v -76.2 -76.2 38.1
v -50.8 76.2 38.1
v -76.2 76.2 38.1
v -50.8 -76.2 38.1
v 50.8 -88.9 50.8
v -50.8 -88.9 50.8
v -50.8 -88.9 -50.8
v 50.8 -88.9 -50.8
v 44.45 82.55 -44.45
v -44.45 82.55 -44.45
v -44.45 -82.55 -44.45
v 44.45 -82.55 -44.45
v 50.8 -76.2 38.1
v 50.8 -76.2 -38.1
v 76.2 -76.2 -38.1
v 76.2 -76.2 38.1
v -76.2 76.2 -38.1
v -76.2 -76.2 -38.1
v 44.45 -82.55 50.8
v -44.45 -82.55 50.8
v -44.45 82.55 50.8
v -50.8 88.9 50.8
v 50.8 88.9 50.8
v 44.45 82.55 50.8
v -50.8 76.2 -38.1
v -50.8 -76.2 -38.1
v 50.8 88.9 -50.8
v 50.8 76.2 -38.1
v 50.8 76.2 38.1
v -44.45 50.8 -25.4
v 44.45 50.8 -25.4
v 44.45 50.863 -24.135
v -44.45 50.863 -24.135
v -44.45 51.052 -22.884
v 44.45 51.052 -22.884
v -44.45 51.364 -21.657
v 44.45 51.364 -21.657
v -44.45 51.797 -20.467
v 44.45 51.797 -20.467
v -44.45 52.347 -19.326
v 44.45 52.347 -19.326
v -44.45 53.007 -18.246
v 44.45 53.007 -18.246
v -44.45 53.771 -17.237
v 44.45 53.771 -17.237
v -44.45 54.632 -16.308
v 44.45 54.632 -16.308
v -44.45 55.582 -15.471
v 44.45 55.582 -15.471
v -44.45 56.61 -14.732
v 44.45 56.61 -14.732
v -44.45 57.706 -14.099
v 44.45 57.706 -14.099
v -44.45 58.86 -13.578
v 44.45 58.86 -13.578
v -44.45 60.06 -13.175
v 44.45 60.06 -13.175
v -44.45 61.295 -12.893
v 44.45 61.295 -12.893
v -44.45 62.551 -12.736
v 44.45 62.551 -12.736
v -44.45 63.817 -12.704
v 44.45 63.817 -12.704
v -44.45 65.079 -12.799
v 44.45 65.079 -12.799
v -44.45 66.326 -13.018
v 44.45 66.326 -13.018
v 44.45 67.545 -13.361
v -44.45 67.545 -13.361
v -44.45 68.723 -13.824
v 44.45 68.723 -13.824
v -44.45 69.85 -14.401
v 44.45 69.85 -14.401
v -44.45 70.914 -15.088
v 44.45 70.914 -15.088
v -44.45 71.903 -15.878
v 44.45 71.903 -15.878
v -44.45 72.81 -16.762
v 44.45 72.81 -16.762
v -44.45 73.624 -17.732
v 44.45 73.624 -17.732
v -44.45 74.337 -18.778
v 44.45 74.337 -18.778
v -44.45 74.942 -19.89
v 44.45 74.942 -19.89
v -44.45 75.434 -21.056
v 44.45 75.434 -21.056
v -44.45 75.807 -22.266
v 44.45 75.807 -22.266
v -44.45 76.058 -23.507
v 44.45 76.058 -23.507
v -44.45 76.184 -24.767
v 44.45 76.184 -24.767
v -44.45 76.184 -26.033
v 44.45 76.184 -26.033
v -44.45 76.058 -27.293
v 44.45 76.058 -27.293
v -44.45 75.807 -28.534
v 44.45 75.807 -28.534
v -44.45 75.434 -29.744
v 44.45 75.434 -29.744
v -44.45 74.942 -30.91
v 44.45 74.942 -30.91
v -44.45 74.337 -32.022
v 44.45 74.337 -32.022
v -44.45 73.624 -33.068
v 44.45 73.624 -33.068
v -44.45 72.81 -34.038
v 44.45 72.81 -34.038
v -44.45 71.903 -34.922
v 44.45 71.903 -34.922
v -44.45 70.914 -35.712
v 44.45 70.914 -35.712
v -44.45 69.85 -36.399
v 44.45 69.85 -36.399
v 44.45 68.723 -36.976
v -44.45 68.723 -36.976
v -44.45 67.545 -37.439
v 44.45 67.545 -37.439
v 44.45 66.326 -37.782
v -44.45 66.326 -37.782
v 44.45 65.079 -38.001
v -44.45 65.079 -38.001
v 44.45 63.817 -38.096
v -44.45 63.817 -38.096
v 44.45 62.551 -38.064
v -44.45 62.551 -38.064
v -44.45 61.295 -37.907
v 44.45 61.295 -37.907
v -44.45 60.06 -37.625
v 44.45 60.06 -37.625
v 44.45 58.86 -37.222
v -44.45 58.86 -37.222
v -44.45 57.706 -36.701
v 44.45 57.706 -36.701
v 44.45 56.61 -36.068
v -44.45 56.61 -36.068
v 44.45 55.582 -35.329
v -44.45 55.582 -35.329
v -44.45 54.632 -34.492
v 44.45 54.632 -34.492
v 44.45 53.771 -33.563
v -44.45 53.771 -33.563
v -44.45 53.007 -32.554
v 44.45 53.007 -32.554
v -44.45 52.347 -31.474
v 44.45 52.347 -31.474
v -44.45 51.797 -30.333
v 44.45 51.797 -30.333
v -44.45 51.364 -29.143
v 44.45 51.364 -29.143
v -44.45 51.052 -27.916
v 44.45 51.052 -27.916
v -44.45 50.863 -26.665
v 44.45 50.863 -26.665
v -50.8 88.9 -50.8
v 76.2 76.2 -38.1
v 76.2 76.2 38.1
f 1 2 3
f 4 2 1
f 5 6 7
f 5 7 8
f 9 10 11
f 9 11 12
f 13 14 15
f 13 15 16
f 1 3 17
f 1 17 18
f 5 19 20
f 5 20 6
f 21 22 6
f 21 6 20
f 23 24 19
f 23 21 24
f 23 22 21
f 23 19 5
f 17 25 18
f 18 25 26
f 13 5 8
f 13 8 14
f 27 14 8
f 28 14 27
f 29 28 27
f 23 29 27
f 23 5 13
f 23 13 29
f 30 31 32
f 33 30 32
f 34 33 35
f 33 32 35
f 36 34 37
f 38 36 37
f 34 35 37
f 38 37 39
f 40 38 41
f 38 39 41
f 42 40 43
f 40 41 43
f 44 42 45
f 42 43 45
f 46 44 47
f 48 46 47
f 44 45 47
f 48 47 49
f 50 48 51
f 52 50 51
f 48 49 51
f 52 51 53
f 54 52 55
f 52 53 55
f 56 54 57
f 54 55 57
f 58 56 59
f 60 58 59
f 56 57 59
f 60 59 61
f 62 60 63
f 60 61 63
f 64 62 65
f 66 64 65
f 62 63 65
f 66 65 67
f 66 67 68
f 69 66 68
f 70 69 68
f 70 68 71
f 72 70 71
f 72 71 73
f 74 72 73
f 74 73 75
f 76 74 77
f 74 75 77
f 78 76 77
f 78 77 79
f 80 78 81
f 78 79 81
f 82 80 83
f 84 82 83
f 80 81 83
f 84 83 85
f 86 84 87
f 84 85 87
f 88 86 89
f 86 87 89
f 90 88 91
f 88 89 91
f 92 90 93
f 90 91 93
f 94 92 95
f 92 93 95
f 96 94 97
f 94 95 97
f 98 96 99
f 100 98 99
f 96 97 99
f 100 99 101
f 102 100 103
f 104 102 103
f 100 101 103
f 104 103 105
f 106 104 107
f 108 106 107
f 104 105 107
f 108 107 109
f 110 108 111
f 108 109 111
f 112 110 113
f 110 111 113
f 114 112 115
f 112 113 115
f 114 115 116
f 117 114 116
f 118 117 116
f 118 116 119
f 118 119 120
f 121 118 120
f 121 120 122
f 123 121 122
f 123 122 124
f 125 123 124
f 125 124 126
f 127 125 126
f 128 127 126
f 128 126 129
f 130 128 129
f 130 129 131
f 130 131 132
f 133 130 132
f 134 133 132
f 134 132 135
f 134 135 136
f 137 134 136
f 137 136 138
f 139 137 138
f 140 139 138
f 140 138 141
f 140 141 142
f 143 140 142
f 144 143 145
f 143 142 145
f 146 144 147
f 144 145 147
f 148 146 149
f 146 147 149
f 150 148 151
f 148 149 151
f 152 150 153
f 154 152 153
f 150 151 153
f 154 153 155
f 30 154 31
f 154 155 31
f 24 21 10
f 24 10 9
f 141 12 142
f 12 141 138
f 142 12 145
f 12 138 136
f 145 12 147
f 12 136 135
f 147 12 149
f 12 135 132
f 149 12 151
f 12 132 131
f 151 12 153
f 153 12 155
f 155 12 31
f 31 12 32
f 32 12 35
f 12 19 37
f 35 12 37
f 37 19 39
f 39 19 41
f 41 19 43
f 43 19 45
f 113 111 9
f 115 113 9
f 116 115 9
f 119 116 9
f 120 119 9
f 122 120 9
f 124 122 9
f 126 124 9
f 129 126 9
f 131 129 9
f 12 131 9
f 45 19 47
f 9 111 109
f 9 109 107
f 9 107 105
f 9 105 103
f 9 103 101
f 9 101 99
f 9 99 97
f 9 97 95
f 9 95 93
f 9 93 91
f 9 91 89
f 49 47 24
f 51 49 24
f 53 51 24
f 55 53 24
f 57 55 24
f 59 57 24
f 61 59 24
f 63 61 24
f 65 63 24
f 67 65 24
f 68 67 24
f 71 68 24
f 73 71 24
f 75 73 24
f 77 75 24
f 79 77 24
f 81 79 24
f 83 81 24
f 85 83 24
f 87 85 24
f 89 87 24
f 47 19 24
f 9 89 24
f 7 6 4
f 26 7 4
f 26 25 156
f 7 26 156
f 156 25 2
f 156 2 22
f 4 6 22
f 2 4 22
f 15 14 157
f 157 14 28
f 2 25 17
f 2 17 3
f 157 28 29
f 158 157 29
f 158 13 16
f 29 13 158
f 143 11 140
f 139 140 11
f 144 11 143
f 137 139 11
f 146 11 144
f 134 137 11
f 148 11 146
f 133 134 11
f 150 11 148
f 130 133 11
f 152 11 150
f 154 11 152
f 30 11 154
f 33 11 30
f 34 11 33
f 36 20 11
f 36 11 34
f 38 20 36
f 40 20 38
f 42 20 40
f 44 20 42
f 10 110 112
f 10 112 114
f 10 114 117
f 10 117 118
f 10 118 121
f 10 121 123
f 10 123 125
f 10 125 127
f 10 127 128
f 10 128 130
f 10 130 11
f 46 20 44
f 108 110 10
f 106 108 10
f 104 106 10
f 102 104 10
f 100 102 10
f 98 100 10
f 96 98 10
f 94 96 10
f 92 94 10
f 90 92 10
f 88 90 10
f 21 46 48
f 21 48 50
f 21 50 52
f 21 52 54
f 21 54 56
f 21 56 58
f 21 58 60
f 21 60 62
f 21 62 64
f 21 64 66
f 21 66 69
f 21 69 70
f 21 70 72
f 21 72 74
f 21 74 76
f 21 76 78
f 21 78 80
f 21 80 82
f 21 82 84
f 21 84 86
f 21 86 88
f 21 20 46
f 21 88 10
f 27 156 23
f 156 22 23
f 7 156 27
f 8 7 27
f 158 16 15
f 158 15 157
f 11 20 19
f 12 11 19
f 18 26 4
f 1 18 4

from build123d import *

# Parameters (mm, degrees)
F0_W     = 101.6
F0_H     = 177.8
F1_DEPTH = 50.8
F2_T     = -6.35
F3_W     = 152.4
F3_H     = 76.2
F4_DEPTH = 25.4
F5_W     = 152.4
F5_H     = 76.2
F6_DEPTH = 25.4
F7_R     = 12.7
F8_DEPTH = 88.9


with BuildPart() as f1:
    # F0 (on Top) → F1 (new body, symmetric)
    with BuildSketch(Plane.XY):
        Rectangle(F0_W, F0_H)
    extrude(amount=F1_DEPTH, both=True)

    # F2
    f2_openings = [f1.faces().sort_by_distance(p)[0] for p in [
        (0, 0, 50.8),
    ]]
    offset(amount=F2_T, openings=f2_openings)

    # F3 (on face) → F4 (join)
    with BuildSketch(Plane.YZ.offset(50.8)):
        Rectangle(F3_W, F3_H)
    extrude(amount=F4_DEPTH)

    # F5 (on face) → F6 (join)
    with BuildSketch(Plane(origin=(-50.8, 0, 0), x_dir=(0, -1, 0), z_dir=(-1, 0, 0))):
        Rectangle(F5_W, F5_H)
    extrude(amount=F6_DEPTH)

    # F7 (on face) → F8 (join)
    with BuildSketch(Plane(origin=(44.45, 0, 0), x_dir=(0, -1, 0), z_dir=(-1, 0, 0))):
        with Locations((-63.5, -25.4)):
            Circle(F7_R)
    extrude(amount=F8_DEPTH)


solid = f1.part
